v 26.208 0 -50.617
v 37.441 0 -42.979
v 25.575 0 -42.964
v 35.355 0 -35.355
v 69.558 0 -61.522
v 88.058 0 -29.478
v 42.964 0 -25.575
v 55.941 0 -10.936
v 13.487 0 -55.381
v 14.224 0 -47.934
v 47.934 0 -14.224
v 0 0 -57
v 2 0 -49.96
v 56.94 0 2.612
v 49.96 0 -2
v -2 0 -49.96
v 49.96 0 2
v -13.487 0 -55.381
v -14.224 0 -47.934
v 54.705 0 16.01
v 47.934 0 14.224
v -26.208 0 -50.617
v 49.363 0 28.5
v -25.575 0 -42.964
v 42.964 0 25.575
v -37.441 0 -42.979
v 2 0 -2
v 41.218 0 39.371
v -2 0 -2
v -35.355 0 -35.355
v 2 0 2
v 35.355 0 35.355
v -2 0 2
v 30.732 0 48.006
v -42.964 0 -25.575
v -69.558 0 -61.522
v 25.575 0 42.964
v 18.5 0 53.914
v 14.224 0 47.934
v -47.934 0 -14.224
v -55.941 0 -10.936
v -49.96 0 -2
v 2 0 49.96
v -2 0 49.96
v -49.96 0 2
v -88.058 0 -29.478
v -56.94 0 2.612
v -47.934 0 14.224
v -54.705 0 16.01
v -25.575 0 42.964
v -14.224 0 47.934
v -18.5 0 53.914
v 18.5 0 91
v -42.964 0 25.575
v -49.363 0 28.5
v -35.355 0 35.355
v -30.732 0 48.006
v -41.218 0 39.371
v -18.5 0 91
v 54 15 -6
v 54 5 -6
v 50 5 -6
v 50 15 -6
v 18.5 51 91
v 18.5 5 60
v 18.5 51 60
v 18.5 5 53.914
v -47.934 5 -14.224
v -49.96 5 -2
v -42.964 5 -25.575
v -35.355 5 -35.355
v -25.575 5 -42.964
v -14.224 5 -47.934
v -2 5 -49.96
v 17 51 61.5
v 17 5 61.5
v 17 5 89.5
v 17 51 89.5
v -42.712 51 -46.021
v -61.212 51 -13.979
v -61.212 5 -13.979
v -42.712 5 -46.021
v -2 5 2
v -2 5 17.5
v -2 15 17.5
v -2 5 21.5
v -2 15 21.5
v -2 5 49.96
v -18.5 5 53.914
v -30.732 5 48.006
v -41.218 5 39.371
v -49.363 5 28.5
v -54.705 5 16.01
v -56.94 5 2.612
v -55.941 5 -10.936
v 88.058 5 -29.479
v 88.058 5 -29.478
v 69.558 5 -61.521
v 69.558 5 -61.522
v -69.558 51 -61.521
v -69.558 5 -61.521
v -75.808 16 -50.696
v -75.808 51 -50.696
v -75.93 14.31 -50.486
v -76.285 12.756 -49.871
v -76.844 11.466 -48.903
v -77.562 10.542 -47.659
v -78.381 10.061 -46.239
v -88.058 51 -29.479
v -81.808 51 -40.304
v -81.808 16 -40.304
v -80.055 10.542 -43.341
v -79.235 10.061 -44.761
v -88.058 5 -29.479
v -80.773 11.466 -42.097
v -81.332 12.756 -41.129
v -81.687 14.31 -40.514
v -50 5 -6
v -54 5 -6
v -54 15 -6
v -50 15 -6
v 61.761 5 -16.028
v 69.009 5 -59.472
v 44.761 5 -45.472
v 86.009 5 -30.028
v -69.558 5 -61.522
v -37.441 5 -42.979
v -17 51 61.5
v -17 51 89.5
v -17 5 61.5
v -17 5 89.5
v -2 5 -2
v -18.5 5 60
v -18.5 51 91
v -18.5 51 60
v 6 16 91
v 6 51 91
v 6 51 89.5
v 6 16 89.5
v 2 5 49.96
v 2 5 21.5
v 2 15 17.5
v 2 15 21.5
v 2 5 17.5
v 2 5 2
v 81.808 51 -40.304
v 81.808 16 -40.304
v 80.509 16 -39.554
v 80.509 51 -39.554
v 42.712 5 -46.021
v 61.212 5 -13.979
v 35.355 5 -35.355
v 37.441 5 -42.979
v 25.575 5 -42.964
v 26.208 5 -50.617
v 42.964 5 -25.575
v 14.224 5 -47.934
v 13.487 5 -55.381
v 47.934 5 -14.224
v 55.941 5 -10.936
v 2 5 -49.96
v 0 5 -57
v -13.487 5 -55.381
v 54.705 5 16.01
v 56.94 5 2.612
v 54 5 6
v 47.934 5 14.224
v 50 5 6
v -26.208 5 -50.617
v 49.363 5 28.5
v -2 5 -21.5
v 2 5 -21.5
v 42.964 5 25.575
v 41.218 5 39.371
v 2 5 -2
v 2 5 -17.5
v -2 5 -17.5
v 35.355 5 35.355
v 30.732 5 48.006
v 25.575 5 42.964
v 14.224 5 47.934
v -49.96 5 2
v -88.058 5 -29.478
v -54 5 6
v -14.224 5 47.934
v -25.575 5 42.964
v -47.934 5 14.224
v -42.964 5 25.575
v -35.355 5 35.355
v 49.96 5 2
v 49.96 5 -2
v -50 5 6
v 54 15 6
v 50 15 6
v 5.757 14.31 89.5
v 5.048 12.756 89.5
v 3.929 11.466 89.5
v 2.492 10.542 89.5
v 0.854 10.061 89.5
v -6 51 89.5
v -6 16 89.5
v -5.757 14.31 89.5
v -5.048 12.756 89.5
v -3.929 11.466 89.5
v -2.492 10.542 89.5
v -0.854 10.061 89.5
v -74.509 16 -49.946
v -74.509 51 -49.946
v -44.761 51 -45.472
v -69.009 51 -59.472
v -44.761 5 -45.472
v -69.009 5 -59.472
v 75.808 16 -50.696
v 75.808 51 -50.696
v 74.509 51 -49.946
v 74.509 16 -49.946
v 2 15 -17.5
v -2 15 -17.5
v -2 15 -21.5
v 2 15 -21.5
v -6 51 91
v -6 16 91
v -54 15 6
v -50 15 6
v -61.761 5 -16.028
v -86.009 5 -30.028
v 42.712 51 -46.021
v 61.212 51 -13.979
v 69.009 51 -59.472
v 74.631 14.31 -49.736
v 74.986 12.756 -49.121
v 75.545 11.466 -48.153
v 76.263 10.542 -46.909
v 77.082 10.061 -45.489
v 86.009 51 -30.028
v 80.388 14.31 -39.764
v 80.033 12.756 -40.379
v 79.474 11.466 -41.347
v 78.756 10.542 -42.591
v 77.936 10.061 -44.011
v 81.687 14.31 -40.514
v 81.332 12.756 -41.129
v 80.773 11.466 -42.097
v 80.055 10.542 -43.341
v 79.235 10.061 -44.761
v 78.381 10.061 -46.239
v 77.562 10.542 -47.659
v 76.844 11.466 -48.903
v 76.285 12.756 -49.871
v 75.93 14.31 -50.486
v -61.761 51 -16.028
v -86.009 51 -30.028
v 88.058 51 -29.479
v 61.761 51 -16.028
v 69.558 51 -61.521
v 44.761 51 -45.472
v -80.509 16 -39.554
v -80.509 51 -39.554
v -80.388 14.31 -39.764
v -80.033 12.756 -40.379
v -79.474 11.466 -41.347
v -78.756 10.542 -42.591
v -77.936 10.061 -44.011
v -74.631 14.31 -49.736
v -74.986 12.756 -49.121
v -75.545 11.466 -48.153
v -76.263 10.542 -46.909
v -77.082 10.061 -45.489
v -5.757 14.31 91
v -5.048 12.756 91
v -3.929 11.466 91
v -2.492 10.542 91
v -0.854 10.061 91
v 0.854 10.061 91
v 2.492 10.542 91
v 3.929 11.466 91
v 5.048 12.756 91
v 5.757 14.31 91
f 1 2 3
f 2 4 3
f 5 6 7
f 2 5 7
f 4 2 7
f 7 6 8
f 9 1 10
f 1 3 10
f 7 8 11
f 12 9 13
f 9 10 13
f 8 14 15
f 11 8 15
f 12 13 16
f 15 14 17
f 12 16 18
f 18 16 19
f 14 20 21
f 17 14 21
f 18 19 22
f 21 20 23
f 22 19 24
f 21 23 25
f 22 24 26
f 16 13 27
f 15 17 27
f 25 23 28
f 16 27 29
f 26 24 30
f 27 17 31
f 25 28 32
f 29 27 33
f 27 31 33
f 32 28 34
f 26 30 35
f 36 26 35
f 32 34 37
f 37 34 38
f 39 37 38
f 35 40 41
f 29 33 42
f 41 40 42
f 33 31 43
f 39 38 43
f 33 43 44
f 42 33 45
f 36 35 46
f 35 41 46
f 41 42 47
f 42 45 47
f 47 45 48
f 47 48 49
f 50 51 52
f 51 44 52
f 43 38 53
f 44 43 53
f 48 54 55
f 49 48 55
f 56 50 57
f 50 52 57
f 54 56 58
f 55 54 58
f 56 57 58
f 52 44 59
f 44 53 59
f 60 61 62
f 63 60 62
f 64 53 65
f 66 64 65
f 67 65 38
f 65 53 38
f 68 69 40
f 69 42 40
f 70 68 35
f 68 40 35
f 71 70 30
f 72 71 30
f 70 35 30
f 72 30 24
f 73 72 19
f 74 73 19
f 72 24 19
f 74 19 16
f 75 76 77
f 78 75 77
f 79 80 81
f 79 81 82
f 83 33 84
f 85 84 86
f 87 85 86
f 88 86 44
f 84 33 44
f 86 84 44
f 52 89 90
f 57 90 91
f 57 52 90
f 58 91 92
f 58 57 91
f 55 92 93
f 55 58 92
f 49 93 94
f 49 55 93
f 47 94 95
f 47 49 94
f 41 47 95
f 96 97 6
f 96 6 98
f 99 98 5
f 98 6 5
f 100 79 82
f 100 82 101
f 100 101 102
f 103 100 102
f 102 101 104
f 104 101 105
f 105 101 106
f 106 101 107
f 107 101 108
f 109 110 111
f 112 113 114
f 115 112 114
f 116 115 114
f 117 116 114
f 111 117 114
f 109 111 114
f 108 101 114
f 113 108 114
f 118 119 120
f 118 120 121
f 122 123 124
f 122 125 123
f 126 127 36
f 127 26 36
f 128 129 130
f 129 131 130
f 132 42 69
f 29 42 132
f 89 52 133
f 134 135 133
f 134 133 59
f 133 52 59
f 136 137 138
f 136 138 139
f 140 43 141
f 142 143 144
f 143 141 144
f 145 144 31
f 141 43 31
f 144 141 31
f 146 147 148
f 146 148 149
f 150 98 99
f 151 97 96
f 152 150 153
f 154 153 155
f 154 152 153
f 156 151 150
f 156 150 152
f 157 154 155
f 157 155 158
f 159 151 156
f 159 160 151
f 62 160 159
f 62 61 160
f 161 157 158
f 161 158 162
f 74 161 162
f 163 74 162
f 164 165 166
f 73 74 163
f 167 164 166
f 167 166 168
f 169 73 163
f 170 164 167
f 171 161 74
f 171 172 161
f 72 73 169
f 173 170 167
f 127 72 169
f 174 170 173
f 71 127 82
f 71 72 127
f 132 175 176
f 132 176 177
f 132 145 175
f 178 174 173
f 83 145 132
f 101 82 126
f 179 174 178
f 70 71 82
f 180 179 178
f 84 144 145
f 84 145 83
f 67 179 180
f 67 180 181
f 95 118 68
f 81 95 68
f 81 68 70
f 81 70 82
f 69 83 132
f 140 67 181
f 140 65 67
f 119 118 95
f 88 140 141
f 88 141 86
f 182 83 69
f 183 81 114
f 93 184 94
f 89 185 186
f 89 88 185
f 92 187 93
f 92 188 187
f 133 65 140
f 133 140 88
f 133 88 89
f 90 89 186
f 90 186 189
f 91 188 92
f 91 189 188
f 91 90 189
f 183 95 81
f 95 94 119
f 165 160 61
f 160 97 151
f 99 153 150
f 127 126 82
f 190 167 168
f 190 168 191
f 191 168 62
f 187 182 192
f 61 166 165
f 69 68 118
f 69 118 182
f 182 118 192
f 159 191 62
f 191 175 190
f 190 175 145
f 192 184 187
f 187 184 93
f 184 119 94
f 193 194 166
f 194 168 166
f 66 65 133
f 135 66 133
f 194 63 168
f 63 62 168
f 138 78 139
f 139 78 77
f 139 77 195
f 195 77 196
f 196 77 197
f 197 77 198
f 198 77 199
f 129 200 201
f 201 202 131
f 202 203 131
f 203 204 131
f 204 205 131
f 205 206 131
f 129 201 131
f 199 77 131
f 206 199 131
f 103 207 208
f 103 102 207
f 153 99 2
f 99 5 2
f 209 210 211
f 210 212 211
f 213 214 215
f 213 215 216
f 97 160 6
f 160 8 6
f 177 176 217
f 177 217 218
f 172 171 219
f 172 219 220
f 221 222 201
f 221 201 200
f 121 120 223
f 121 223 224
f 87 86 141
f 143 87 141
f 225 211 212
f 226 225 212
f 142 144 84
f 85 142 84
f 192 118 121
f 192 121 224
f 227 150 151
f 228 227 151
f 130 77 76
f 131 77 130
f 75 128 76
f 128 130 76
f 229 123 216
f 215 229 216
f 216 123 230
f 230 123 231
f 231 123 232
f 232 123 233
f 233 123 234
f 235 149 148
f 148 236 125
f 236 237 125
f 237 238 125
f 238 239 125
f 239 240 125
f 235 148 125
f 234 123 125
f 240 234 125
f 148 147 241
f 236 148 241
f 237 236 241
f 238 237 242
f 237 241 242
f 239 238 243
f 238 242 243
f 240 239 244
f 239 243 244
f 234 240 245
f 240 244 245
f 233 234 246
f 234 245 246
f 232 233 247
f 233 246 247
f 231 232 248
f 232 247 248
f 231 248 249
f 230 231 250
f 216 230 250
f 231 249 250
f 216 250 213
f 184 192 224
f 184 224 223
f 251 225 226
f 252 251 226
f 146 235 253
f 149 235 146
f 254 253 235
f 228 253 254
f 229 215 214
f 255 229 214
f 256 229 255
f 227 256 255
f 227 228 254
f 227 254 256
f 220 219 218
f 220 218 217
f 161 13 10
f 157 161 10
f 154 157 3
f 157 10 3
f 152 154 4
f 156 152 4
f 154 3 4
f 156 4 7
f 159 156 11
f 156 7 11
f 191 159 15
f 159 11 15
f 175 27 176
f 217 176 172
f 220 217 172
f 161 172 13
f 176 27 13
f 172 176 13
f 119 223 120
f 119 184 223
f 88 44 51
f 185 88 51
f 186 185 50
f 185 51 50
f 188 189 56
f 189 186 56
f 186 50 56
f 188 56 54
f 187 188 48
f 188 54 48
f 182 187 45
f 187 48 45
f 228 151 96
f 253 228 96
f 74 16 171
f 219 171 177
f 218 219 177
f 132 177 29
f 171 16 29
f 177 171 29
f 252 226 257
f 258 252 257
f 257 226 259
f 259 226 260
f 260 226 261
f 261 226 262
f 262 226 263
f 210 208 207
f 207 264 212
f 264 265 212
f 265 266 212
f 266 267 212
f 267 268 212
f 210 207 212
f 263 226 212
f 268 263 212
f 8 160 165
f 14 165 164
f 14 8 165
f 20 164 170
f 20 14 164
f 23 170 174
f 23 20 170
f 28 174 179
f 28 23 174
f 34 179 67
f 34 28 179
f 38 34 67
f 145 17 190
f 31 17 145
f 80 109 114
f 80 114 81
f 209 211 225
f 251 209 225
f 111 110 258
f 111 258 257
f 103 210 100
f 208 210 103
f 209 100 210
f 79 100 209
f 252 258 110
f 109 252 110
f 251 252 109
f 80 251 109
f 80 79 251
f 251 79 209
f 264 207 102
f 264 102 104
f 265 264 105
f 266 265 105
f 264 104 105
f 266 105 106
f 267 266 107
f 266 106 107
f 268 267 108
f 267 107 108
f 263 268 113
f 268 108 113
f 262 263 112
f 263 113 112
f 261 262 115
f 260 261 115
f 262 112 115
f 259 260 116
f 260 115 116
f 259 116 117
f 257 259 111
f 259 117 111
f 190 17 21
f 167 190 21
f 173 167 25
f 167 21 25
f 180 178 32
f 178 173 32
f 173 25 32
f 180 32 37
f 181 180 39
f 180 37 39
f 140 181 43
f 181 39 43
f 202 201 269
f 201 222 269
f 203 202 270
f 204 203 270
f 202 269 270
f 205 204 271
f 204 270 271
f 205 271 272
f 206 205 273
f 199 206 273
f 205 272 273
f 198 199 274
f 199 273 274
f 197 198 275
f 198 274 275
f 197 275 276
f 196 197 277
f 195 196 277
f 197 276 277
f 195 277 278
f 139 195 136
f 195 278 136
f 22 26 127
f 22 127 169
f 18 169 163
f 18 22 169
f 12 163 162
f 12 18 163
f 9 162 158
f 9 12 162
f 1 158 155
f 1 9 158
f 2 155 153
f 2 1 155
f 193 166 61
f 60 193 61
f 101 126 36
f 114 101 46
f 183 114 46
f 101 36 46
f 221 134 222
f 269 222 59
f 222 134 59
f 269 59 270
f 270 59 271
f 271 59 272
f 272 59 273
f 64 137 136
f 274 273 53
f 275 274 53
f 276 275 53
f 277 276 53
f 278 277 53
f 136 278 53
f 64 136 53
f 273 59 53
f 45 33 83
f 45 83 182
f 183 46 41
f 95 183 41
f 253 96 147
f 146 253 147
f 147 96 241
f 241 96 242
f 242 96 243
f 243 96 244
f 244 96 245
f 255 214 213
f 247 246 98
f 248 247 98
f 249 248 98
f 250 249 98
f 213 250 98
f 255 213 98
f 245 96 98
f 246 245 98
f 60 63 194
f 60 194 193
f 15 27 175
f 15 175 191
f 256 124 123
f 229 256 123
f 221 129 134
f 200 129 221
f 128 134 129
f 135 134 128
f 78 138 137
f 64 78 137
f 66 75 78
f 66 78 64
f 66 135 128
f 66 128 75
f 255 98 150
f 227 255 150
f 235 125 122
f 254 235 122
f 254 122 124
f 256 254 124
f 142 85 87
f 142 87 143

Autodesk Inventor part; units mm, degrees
ref_plane "YZ Plane" through (0, 0, 0) normal (1, 0, 0) x (0, 1, 0)
ref_plane "XZ Plane" through (0, 0, 0) normal (0, 1, 0) x (-1, 0, 0)
ref_plane "XY Plane" through (0, 0, 0) normal (0, 0, 1) x (1, 0, 0)
sketch "Sketch1" plane through (0, 0, 0) normal (0, 1, 0) x (-1, 0, 0)
  circle A0 centre (0, 0) radius 57
  circle A1 centre (0, 0) radius 50
  line L0 (0, -92.0258) -> (0, 121.5043) projected
  line L1 (123.2816, 0) -> (-123.2816, 0) projected
  line L2 (-50, 2) -> (50, 2)
  line L3 (50, 2) -> (50, -2)
  line L4 (50, -2) -> (-50, -2)
  line L5 (-50, -2) -> (-50, 2)
  line L6 (-50, 2) -> (50, -2) construction
  line L7 (50, 2) -> (-50, -2) construction
  line L8 (2, 50) -> (-2, 50)
  line L9 (-2, 50) -> (-2, -50)
  line L10 (-2, -50) -> (2, -50)
  line L11 (2, -50) -> (2, 50)
  line L12 (2, 50) -> (-2, -50) construction
  line L13 (-2, 50) -> (2, -50) construction
  line L14 (18.5, 91) -> (-18.5, 91)
  line L15 (-18.5, 91) -> (-18.5, 50)
  line L16 (-18.5, 50) -> (18.5, 50)
  line L17 (18.5, 50) -> (18.5, 91)
  line L18 (0, 91) -> (0, 50) construction
  line L19 (18.5, 60) -> (-18.5, 60)
  line L20 (-44.3013, -23.2679) -> (-42.3013, -26.7321)
  line L21 (-34.0513, -41.0215) -> (-52.5513, -8.9785)
  line L22 (-61.2115, -13.9785) -> (-42.7115, -46.0215)
  line L23 (-69.5583, -61.5215) -> (-34.0513, -41.0215)
  line L24 (-52.5513, -8.9785) -> (-88.0583, -29.4785)
  line L25 (-78.8083, -45.5) -> (-43.3013, -25) construction
  line L26 (-88.0583, -29.4785) -> (-69.5583, -61.5215)
  line L27 (42.3013, -26.7321) -> (44.3013, -23.2679)
  line L28 (52.5513, -8.9785) -> (34.0513, -41.0215)
  line L29 (42.7115, -46.0215) -> (61.2115, -13.9785)
  line L30 (88.0583, -29.4785) -> (52.5513, -8.9785)
  line L31 (34.0513, -41.0215) -> (69.5583, -61.5215)
  line L32 (78.8083, -45.5) -> (43.3013, -25) construction
  line L33 (69.5583, -61.5215) -> (88.0583, -29.4785)
  point P0 (2, -49.96)
  point P1 (2, -2)
  point P2 (49.96, -2)
  point P3 (-2, 49.96)
  point P4 (-2, 2)
  point P5 (-49.96, 2)
  point P6 (-2, -49.96)
  point P7 (-49.96, -2)
  point P8 (-2, -2)
  point P9 (-18.5, 53.9143)
  point P10 (-55.9411, -10.9357)
  point P11 (-37.4411, -42.9786)
  point P12 (37.4411, -42.9786)
  point P13 (55.9411, -10.9357)
  point P14 (18.5, 53.9143)
  point P15 (2, 49.96)
  point P16 (49.96, 2)
  point P17 (2, 2)
  dimension "d0" = 114
  dimension "d1" = 100
  dimension "d6" = 100
  dimension "d7" = 4
  dimension "d8" = 4
  dimension "d9" = 100
  dimension "d10" = 37
  dimension "d14" = 60
  dimension "d15" = 31
  dimension "d18" = 360
extrude "Extrusion1" add sketch "Sketch1" along normal blind 5 contours L1 L3 L2 A1 L11 L16 L17 A0 | A0 L30 L28 L27 A1 L4 L3 L1 | L17 L16 L8 L0 A0 | A0 L0 L19 L17 | L30 L29 L31 A0 | A0 L31 L28 L27 L30 | L1 L11 L2 A1 | L3 L4 A1 | A1 L4 L11 L1 | A1 L2 L3 | L0 L8 L16 L15 A0 | A0 L15 L19 L0 | L19 L0 L14 L17 | A0 L0 L10 L11 A1 L27 L28 L31 | L30 L33 L31 L29 | L11 L4 L0 L1 | L1 L0 L2 L11 | L15 L16 L9 A1 L2 L5 L1 A0 | L8 L11 A1 | L0 L2 L9 A1 | A1 L11 L2 L0 | A1 L9 L8 | L19 L15 L14 L0 | A0 L23 L21 L20 A1 L9 L10 L0 | L11 A1 L0 L4 | L1 L9 L2 L0 | L0 L4 L9 L1 | L1 L5 L4 A1 L20 L21 L24 A0 | L23 L22 L24 A0 | A0 L24 L21 L20 L23 | L10 L9 A1 | A1 L9 L4 L0 | A1 L11 L10 | L9 L4 A1 L1 | L1 A1 L2 L9 | L5 L2 A1 | A1 L4 L5 | L23 L26 L24 L22
sketch "Sketch2" plane through (0, 5, 0) normal (0, 1, 0) x (1, 0, 0)
  line L0 (-18.5, -53.9143) -> (-18.5, -91) projected
  line L1 (18.5, -91) -> (18.5, -53.9143) projected
  line L2 (-18.5, -91) -> (18.5, -91)
  line L3 (18.5, -91) -> (18.5, -60)
  line L4 (18.5, -60) -> (-18.5, -60)
  line L5 (-18.5, -60) -> (-18.5, -91)
  line L6 (-17, -61.5) -> (17, -61.5)
  line L7 (17, -61.5) -> (17, -89.5)
  line L8 (17, -89.5) -> (-17, -89.5)
  line L9 (-17, -89.5) -> (-17, -61.5)
  line L10 (88.0583, 29.4785) -> (69.5583, 61.5215)
  line L11 (69.5583, 61.5215) -> (42.7115, 46.0215)
  line L12 (42.7115, 46.0215) -> (61.2115, 13.9785)
  line L13 (61.2115, 13.9785) -> (88.0583, 29.4785)
  line L14 (61.7606, 16.0276) -> (44.7606, 45.4724)
  line L15 (44.7606, 45.4724) -> (69.0093, 59.4724)
  line L16 (69.0093, 59.4724) -> (86.0093, 30.0276)
  line L17 (86.0093, 30.0276) -> (61.7606, 16.0276)
  line L18 (-69.5583, 61.5215) -> (-88.0583, 29.4785)
  line L19 (-88.0583, 29.4785) -> (-61.2115, 13.9785)
  line L20 (-61.2115, 13.9785) -> (-42.7115, 46.0215)
  line L21 (-42.7115, 46.0215) -> (-69.5583, 61.5215)
  line L22 (-44.7606, 45.4724) -> (-61.7606, 16.0276)
  line L23 (-61.7606, 16.0276) -> (-86.0093, 30.0276)
  line L24 (-86.0093, 30.0276) -> (-69.0093, 59.4724)
  line L25 (-69.0093, 59.4724) -> (-44.7606, 45.4724)
  point P0 (0, 0)
  dimension "d22" = 31
  dimension "d23" = 1.5
  dimension "d26" = 360
extrude "Extrusion2" add sketch "Sketch2" along normal blind 46 contours L4 L1 L2 L0
sketch "Sketch4" plane through (-18.5, 0, 91) normal (0, 0, 1) x (1, 0, 0)
  line L0 (0, 51) -> (37, 51) construction
  line L1 (12.5, 51) -> (24.5, 51)
  line L2 (24.5, 51) -> (24.5, 10)
  line L3 (24.5, 10) -> (12.5, 10)
  line L4 (12.5, 10) -> (12.5, 51)
  line L5 (1.5, 5) -> (35.5, 5) construction
  line L6 (18.5, -10.2) -> (18.5, 61.2) construction
  circle A0 centre (18.5, 16) radius 6
  point P0 (18.5, 0)
  point P1 (12.5, 16)
  point P2 (24.5, 16)
  dimension "d36" = 12
  dimension "d37" = 5
  dimension "d38" = 6
extrude "Extrusion3" cut sketch "Sketch4" against normal up to next contours L1 L2 A0 L4 | A0
pattern_circular "Circular Pattern1" count 3 over 360 about axis through (0, -10, 0) along (0, 1, 0) of "Extrusion2", "Extrusion3"
sketch "Sketch5" plane through (0, 5, 0) normal (0, 1, 0) x (1, 0, 0)
  line L0 (-2, -21.5) -> (2, -21.5)
  line L1 (2, -21.5) -> (2, -17.5)
  line L2 (2, -17.5) -> (-2, -17.5)
  line L3 (-2, -17.5) -> (-2, -21.5)
  line L4 (-2, -2) -> (-2, -49.96) construction
  line L5 (2, -49.96) -> (2, -2) construction
  line L6 (-123.2816, 0) -> (123.2816, 0) construction
  line L7 (-2, 21.5) -> (2, 21.5)
  line L8 (2, 21.5) -> (2, 17.5)
  line L9 (2, 17.5) -> (-2, 17.5)
  line L10 (-2, 17.5) -> (-2, 21.5)
  arc A0 (-49.96, -2) -> (-2, -49.96) centre (0, 0) ccw construction
  arc A1 (-2, 49.96) -> (-49.96, 2) centre (0, 0) ccw construction
  circle A2 centre (0, 0) radius 50 construction
  line L11 (-54, 6) -> (-50, 6)
  line L12 (-50, 6) -> (-50, -6)
  line L13 (-50, -6) -> (-54, -6)
  line L14 (-54, -6) -> (-54, 6)
  line L15 (-54, 0) -> (-50, 0) construction
  line L16 (0, 92.0258) -> (0, -121.5043) construction
  line L17 (54, 6) -> (50, 6)
  line L18 (50, 6) -> (50, -6)
  line L19 (50, -6) -> (54, -6)
  line L20 (54, -6) -> (54, 6)
  line L21 (54, 0) -> (50, 0) construction
  point P0 (49.96, -2)
  point P1 (49.96, 2)
  dimension "d41" = 17.5
  dimension "d42" = 4
  dimension "d43" = 12
extrude "Extrusion4" add sketch "Sketch5" along normal blind 10
equation "\"d38\" = 0.5 * d36"
properties part number "bottom"
